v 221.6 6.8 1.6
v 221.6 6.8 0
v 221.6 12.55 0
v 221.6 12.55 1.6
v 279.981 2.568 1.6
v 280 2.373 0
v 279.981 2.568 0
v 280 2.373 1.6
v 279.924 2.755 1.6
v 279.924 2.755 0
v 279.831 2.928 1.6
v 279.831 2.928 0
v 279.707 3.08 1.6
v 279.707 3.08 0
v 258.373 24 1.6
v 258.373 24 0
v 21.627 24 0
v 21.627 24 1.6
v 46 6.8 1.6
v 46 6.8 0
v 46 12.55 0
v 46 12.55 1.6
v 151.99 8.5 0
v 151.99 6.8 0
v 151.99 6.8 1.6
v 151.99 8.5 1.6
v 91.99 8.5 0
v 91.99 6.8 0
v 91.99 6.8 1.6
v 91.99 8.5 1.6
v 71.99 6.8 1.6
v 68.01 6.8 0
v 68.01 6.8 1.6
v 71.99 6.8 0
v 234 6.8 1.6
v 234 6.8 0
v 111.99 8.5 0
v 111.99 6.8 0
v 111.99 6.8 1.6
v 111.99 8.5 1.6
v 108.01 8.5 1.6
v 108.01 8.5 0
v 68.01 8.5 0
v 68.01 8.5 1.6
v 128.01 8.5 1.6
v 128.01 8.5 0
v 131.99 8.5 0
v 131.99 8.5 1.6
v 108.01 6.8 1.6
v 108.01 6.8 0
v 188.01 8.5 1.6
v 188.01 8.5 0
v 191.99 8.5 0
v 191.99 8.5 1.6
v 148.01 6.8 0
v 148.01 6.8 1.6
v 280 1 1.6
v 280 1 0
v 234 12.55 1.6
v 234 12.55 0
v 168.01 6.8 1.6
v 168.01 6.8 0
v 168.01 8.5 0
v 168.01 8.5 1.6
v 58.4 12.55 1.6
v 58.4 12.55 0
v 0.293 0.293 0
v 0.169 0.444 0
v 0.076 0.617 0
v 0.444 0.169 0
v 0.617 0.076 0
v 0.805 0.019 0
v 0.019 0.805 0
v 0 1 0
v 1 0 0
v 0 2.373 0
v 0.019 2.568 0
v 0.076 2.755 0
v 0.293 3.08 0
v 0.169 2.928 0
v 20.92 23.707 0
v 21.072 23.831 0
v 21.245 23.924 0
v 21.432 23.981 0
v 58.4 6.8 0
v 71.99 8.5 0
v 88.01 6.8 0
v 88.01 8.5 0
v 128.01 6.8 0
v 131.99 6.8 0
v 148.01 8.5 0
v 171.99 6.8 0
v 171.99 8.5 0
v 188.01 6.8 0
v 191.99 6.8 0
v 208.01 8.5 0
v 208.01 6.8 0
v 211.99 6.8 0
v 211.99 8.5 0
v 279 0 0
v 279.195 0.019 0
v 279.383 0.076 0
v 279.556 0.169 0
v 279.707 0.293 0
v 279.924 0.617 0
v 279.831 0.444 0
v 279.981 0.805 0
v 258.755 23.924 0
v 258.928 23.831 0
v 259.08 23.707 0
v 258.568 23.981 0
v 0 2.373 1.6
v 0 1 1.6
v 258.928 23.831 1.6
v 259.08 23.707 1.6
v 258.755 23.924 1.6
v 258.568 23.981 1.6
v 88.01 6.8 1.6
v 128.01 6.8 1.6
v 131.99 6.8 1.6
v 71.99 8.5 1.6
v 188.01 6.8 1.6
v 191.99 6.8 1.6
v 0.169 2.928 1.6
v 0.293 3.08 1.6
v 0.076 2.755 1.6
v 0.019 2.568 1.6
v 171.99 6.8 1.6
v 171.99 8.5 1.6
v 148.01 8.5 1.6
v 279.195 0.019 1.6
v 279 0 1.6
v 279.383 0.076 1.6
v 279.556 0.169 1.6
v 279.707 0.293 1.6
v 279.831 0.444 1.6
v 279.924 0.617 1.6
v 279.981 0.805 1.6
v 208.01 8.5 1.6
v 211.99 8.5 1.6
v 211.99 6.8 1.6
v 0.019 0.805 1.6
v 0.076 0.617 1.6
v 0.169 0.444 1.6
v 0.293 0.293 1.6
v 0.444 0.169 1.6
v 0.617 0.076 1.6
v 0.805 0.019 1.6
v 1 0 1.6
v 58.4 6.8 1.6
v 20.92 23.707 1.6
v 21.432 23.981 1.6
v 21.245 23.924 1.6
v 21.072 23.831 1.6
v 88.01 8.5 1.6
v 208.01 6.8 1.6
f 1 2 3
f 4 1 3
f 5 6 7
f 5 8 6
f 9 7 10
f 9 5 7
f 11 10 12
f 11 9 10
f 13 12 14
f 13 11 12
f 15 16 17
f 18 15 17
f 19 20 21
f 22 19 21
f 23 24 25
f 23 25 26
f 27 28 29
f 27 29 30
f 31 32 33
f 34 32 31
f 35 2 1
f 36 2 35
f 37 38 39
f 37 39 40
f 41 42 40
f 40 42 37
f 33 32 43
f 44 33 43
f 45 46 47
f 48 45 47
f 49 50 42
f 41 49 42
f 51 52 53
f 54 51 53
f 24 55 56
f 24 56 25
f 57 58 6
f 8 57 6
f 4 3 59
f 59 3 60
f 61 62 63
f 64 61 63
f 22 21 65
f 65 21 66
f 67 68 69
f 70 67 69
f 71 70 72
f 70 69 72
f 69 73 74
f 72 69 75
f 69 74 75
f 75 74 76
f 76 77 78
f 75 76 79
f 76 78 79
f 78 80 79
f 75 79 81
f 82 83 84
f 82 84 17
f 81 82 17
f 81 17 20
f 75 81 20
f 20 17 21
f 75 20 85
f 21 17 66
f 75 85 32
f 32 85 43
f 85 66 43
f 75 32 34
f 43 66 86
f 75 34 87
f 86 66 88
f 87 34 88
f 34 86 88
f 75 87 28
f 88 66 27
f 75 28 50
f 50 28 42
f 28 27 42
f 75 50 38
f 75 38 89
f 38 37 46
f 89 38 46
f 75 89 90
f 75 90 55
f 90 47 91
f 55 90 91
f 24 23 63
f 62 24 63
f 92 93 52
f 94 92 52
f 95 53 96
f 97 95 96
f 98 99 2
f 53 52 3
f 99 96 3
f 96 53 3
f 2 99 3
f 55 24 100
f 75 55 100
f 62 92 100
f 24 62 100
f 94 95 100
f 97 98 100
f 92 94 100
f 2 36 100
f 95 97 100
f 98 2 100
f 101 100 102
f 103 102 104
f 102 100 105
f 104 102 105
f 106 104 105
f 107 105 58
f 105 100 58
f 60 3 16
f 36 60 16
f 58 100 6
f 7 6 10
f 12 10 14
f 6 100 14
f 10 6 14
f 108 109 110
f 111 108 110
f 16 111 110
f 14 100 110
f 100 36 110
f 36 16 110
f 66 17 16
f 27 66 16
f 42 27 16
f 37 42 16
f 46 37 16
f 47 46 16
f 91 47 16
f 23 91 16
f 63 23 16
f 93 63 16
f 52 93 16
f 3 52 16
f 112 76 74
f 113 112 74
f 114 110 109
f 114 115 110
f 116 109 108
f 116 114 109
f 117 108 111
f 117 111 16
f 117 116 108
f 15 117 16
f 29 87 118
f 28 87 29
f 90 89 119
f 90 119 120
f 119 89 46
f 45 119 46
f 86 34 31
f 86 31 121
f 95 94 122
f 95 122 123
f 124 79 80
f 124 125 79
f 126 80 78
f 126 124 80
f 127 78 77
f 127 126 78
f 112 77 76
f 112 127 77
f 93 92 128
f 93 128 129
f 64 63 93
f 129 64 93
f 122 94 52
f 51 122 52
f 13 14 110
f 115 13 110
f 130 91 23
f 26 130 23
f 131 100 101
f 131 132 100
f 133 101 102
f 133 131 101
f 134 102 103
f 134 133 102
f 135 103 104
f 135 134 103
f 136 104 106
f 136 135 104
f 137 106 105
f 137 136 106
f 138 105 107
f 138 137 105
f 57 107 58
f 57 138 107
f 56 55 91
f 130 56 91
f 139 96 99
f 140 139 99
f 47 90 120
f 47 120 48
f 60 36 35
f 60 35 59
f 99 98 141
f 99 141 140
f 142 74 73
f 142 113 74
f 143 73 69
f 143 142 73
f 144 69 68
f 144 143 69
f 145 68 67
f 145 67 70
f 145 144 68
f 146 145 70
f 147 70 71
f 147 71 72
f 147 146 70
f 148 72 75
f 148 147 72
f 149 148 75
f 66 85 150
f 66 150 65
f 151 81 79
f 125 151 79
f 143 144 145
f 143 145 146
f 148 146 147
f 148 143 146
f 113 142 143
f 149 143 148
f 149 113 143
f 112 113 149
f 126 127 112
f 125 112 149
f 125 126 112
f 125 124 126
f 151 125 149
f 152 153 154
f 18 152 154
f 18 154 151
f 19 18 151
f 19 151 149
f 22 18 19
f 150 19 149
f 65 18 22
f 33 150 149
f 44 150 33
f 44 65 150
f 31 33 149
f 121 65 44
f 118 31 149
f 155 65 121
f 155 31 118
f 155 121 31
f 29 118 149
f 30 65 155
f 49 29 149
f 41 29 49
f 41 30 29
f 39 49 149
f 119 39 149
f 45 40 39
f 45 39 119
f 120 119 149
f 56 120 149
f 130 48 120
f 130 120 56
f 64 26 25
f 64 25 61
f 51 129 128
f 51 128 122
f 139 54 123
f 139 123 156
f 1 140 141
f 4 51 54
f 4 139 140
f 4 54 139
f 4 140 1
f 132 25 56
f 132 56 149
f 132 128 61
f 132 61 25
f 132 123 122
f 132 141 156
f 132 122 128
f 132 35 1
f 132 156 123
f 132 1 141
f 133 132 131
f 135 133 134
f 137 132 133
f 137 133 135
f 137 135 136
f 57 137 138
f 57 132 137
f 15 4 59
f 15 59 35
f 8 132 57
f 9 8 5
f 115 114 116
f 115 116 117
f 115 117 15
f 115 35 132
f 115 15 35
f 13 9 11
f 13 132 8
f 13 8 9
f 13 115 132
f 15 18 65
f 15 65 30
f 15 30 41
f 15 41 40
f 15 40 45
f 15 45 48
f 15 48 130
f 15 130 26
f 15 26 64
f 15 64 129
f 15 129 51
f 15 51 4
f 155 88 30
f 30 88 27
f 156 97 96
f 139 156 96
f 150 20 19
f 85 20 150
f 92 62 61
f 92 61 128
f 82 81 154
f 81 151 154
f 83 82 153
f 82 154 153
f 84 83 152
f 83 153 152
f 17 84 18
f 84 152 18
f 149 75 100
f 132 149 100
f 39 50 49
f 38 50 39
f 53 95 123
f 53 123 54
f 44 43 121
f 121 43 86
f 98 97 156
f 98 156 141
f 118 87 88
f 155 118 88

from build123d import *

# Parameters (mm, degrees)
BOSS_EXTRUDE1_DEPTH     = 1.6
FILLET1_R               = 1
BOSS_EXTRUDE2_DEPTH     = 1.6
CUT_EXTRUDE1_DEPTH      = 282.031243815
CUT_EXTRUDE1_DEPTH_BACK = 282.031243815
SKETCH2_W               = 12.4
SKETCH2_H               = 5.75
SKETCH2_W_2             = 3.98
SKETCH2_H_2             = 1.7


with BuildPart() as part:
    # Sketch1 → Boss-Extrude1 (new body)
    with BuildSketch(Plane.XY):
        with BuildLine():
            Line((21.213203436, 24), (0, 2.786796564))
            Line((0, 2.786796564), (0, 0))
            Line((0, 0), (42, 0))
            Line((42, 0), (42, 11))
            ThreePointArc((42, 11), (43.171572875, 13.828427125), (46, 15))
            Line((46, 15), (234, 15))
            ThreePointArc((234, 15), (236.828427125, 13.828427125), (238, 11))
            Line((238, 11), (238, 0))
            Line((238, 0), (280, 0))
            Line((280, 0), (280, 2.786796564))
            Line((280, 2.786796564), (258.786796564, 24))
            Line((258.786796564, 24), (21.213203436, 24))
        make_face()
    extrude(amount=BOSS_EXTRUDE1_DEPTH)

    # Fillet1
    fillet1_edges = [part.edges().sort_by_distance(p)[0] for p in [
        (0, 0, 0.8),
        (0, 2.786796564, 0.8),
        (21.213203436, 24, 0.8),
        (258.786796564, 24, 0.8),
        (280, 2.786796564, 0.8),
        (280, 0, 0.8),
    ]]
    fillet(fillet1_edges, radius=FILLET1_R)

    # Sketch1<3> → Boss-Extrude2 (add)
    with BuildSketch(Plane.XY):
        with BuildLine():
            Line((42, 11), (42, 0))
            Line((42, 0), (238, 0))
            Line((238, 0), (238, 11))
            ThreePointArc((238, 11), (236.828427125, 13.828427125), (234, 15))
            Line((234, 15), (46, 15))
            ThreePointArc((46, 15), (43.171572875, 13.828427125), (42, 11))
        make_face()
    extrude(amount=BOSS_EXTRUDE2_DEPTH)

    # Sketch2 → Cut-Extrude1 (cut, two sides: drawn at the far end of the back side and taken through both)
    with BuildSketch(Plane.XY.offset(-CUT_EXTRUDE1_DEPTH_BACK)):
        with Locations((52.2, 9.675)):
            Rectangle(SKETCH2_W, SKETCH2_H)
        with Locations((70, 7.65)):
            Rectangle(SKETCH2_W_2, SKETCH2_H_2)
        with Locations((90, 7.65)):
            Rectangle(SKETCH2_W_2, SKETCH2_H_2)
        with Locations((110, 7.65)):
            Rectangle(SKETCH2_W_2, SKETCH2_H_2)
        with Locations((150, 7.65)):
            Rectangle(SKETCH2_W_2, SKETCH2_H_2)
        with Locations((170, 7.65)):
            Rectangle(SKETCH2_W_2, SKETCH2_H_2)
        with Locations((190, 7.65)):
            Rectangle(SKETCH2_W_2, SKETCH2_H_2)
        with Locations((210, 7.65)):
            Rectangle(SKETCH2_W_2, SKETCH2_H_2)
        with Locations((227.8, 9.675)):
            Rectangle(SKETCH2_W, SKETCH2_H)
        with Locations((130, 7.65)):
            Rectangle(SKETCH2_W_2, SKETCH2_H_2)
    extrude(amount=CUT_EXTRUDE1_DEPTH + CUT_EXTRUDE1_DEPTH_BACK, mode=Mode.SUBTRACT)


solid = part.part
